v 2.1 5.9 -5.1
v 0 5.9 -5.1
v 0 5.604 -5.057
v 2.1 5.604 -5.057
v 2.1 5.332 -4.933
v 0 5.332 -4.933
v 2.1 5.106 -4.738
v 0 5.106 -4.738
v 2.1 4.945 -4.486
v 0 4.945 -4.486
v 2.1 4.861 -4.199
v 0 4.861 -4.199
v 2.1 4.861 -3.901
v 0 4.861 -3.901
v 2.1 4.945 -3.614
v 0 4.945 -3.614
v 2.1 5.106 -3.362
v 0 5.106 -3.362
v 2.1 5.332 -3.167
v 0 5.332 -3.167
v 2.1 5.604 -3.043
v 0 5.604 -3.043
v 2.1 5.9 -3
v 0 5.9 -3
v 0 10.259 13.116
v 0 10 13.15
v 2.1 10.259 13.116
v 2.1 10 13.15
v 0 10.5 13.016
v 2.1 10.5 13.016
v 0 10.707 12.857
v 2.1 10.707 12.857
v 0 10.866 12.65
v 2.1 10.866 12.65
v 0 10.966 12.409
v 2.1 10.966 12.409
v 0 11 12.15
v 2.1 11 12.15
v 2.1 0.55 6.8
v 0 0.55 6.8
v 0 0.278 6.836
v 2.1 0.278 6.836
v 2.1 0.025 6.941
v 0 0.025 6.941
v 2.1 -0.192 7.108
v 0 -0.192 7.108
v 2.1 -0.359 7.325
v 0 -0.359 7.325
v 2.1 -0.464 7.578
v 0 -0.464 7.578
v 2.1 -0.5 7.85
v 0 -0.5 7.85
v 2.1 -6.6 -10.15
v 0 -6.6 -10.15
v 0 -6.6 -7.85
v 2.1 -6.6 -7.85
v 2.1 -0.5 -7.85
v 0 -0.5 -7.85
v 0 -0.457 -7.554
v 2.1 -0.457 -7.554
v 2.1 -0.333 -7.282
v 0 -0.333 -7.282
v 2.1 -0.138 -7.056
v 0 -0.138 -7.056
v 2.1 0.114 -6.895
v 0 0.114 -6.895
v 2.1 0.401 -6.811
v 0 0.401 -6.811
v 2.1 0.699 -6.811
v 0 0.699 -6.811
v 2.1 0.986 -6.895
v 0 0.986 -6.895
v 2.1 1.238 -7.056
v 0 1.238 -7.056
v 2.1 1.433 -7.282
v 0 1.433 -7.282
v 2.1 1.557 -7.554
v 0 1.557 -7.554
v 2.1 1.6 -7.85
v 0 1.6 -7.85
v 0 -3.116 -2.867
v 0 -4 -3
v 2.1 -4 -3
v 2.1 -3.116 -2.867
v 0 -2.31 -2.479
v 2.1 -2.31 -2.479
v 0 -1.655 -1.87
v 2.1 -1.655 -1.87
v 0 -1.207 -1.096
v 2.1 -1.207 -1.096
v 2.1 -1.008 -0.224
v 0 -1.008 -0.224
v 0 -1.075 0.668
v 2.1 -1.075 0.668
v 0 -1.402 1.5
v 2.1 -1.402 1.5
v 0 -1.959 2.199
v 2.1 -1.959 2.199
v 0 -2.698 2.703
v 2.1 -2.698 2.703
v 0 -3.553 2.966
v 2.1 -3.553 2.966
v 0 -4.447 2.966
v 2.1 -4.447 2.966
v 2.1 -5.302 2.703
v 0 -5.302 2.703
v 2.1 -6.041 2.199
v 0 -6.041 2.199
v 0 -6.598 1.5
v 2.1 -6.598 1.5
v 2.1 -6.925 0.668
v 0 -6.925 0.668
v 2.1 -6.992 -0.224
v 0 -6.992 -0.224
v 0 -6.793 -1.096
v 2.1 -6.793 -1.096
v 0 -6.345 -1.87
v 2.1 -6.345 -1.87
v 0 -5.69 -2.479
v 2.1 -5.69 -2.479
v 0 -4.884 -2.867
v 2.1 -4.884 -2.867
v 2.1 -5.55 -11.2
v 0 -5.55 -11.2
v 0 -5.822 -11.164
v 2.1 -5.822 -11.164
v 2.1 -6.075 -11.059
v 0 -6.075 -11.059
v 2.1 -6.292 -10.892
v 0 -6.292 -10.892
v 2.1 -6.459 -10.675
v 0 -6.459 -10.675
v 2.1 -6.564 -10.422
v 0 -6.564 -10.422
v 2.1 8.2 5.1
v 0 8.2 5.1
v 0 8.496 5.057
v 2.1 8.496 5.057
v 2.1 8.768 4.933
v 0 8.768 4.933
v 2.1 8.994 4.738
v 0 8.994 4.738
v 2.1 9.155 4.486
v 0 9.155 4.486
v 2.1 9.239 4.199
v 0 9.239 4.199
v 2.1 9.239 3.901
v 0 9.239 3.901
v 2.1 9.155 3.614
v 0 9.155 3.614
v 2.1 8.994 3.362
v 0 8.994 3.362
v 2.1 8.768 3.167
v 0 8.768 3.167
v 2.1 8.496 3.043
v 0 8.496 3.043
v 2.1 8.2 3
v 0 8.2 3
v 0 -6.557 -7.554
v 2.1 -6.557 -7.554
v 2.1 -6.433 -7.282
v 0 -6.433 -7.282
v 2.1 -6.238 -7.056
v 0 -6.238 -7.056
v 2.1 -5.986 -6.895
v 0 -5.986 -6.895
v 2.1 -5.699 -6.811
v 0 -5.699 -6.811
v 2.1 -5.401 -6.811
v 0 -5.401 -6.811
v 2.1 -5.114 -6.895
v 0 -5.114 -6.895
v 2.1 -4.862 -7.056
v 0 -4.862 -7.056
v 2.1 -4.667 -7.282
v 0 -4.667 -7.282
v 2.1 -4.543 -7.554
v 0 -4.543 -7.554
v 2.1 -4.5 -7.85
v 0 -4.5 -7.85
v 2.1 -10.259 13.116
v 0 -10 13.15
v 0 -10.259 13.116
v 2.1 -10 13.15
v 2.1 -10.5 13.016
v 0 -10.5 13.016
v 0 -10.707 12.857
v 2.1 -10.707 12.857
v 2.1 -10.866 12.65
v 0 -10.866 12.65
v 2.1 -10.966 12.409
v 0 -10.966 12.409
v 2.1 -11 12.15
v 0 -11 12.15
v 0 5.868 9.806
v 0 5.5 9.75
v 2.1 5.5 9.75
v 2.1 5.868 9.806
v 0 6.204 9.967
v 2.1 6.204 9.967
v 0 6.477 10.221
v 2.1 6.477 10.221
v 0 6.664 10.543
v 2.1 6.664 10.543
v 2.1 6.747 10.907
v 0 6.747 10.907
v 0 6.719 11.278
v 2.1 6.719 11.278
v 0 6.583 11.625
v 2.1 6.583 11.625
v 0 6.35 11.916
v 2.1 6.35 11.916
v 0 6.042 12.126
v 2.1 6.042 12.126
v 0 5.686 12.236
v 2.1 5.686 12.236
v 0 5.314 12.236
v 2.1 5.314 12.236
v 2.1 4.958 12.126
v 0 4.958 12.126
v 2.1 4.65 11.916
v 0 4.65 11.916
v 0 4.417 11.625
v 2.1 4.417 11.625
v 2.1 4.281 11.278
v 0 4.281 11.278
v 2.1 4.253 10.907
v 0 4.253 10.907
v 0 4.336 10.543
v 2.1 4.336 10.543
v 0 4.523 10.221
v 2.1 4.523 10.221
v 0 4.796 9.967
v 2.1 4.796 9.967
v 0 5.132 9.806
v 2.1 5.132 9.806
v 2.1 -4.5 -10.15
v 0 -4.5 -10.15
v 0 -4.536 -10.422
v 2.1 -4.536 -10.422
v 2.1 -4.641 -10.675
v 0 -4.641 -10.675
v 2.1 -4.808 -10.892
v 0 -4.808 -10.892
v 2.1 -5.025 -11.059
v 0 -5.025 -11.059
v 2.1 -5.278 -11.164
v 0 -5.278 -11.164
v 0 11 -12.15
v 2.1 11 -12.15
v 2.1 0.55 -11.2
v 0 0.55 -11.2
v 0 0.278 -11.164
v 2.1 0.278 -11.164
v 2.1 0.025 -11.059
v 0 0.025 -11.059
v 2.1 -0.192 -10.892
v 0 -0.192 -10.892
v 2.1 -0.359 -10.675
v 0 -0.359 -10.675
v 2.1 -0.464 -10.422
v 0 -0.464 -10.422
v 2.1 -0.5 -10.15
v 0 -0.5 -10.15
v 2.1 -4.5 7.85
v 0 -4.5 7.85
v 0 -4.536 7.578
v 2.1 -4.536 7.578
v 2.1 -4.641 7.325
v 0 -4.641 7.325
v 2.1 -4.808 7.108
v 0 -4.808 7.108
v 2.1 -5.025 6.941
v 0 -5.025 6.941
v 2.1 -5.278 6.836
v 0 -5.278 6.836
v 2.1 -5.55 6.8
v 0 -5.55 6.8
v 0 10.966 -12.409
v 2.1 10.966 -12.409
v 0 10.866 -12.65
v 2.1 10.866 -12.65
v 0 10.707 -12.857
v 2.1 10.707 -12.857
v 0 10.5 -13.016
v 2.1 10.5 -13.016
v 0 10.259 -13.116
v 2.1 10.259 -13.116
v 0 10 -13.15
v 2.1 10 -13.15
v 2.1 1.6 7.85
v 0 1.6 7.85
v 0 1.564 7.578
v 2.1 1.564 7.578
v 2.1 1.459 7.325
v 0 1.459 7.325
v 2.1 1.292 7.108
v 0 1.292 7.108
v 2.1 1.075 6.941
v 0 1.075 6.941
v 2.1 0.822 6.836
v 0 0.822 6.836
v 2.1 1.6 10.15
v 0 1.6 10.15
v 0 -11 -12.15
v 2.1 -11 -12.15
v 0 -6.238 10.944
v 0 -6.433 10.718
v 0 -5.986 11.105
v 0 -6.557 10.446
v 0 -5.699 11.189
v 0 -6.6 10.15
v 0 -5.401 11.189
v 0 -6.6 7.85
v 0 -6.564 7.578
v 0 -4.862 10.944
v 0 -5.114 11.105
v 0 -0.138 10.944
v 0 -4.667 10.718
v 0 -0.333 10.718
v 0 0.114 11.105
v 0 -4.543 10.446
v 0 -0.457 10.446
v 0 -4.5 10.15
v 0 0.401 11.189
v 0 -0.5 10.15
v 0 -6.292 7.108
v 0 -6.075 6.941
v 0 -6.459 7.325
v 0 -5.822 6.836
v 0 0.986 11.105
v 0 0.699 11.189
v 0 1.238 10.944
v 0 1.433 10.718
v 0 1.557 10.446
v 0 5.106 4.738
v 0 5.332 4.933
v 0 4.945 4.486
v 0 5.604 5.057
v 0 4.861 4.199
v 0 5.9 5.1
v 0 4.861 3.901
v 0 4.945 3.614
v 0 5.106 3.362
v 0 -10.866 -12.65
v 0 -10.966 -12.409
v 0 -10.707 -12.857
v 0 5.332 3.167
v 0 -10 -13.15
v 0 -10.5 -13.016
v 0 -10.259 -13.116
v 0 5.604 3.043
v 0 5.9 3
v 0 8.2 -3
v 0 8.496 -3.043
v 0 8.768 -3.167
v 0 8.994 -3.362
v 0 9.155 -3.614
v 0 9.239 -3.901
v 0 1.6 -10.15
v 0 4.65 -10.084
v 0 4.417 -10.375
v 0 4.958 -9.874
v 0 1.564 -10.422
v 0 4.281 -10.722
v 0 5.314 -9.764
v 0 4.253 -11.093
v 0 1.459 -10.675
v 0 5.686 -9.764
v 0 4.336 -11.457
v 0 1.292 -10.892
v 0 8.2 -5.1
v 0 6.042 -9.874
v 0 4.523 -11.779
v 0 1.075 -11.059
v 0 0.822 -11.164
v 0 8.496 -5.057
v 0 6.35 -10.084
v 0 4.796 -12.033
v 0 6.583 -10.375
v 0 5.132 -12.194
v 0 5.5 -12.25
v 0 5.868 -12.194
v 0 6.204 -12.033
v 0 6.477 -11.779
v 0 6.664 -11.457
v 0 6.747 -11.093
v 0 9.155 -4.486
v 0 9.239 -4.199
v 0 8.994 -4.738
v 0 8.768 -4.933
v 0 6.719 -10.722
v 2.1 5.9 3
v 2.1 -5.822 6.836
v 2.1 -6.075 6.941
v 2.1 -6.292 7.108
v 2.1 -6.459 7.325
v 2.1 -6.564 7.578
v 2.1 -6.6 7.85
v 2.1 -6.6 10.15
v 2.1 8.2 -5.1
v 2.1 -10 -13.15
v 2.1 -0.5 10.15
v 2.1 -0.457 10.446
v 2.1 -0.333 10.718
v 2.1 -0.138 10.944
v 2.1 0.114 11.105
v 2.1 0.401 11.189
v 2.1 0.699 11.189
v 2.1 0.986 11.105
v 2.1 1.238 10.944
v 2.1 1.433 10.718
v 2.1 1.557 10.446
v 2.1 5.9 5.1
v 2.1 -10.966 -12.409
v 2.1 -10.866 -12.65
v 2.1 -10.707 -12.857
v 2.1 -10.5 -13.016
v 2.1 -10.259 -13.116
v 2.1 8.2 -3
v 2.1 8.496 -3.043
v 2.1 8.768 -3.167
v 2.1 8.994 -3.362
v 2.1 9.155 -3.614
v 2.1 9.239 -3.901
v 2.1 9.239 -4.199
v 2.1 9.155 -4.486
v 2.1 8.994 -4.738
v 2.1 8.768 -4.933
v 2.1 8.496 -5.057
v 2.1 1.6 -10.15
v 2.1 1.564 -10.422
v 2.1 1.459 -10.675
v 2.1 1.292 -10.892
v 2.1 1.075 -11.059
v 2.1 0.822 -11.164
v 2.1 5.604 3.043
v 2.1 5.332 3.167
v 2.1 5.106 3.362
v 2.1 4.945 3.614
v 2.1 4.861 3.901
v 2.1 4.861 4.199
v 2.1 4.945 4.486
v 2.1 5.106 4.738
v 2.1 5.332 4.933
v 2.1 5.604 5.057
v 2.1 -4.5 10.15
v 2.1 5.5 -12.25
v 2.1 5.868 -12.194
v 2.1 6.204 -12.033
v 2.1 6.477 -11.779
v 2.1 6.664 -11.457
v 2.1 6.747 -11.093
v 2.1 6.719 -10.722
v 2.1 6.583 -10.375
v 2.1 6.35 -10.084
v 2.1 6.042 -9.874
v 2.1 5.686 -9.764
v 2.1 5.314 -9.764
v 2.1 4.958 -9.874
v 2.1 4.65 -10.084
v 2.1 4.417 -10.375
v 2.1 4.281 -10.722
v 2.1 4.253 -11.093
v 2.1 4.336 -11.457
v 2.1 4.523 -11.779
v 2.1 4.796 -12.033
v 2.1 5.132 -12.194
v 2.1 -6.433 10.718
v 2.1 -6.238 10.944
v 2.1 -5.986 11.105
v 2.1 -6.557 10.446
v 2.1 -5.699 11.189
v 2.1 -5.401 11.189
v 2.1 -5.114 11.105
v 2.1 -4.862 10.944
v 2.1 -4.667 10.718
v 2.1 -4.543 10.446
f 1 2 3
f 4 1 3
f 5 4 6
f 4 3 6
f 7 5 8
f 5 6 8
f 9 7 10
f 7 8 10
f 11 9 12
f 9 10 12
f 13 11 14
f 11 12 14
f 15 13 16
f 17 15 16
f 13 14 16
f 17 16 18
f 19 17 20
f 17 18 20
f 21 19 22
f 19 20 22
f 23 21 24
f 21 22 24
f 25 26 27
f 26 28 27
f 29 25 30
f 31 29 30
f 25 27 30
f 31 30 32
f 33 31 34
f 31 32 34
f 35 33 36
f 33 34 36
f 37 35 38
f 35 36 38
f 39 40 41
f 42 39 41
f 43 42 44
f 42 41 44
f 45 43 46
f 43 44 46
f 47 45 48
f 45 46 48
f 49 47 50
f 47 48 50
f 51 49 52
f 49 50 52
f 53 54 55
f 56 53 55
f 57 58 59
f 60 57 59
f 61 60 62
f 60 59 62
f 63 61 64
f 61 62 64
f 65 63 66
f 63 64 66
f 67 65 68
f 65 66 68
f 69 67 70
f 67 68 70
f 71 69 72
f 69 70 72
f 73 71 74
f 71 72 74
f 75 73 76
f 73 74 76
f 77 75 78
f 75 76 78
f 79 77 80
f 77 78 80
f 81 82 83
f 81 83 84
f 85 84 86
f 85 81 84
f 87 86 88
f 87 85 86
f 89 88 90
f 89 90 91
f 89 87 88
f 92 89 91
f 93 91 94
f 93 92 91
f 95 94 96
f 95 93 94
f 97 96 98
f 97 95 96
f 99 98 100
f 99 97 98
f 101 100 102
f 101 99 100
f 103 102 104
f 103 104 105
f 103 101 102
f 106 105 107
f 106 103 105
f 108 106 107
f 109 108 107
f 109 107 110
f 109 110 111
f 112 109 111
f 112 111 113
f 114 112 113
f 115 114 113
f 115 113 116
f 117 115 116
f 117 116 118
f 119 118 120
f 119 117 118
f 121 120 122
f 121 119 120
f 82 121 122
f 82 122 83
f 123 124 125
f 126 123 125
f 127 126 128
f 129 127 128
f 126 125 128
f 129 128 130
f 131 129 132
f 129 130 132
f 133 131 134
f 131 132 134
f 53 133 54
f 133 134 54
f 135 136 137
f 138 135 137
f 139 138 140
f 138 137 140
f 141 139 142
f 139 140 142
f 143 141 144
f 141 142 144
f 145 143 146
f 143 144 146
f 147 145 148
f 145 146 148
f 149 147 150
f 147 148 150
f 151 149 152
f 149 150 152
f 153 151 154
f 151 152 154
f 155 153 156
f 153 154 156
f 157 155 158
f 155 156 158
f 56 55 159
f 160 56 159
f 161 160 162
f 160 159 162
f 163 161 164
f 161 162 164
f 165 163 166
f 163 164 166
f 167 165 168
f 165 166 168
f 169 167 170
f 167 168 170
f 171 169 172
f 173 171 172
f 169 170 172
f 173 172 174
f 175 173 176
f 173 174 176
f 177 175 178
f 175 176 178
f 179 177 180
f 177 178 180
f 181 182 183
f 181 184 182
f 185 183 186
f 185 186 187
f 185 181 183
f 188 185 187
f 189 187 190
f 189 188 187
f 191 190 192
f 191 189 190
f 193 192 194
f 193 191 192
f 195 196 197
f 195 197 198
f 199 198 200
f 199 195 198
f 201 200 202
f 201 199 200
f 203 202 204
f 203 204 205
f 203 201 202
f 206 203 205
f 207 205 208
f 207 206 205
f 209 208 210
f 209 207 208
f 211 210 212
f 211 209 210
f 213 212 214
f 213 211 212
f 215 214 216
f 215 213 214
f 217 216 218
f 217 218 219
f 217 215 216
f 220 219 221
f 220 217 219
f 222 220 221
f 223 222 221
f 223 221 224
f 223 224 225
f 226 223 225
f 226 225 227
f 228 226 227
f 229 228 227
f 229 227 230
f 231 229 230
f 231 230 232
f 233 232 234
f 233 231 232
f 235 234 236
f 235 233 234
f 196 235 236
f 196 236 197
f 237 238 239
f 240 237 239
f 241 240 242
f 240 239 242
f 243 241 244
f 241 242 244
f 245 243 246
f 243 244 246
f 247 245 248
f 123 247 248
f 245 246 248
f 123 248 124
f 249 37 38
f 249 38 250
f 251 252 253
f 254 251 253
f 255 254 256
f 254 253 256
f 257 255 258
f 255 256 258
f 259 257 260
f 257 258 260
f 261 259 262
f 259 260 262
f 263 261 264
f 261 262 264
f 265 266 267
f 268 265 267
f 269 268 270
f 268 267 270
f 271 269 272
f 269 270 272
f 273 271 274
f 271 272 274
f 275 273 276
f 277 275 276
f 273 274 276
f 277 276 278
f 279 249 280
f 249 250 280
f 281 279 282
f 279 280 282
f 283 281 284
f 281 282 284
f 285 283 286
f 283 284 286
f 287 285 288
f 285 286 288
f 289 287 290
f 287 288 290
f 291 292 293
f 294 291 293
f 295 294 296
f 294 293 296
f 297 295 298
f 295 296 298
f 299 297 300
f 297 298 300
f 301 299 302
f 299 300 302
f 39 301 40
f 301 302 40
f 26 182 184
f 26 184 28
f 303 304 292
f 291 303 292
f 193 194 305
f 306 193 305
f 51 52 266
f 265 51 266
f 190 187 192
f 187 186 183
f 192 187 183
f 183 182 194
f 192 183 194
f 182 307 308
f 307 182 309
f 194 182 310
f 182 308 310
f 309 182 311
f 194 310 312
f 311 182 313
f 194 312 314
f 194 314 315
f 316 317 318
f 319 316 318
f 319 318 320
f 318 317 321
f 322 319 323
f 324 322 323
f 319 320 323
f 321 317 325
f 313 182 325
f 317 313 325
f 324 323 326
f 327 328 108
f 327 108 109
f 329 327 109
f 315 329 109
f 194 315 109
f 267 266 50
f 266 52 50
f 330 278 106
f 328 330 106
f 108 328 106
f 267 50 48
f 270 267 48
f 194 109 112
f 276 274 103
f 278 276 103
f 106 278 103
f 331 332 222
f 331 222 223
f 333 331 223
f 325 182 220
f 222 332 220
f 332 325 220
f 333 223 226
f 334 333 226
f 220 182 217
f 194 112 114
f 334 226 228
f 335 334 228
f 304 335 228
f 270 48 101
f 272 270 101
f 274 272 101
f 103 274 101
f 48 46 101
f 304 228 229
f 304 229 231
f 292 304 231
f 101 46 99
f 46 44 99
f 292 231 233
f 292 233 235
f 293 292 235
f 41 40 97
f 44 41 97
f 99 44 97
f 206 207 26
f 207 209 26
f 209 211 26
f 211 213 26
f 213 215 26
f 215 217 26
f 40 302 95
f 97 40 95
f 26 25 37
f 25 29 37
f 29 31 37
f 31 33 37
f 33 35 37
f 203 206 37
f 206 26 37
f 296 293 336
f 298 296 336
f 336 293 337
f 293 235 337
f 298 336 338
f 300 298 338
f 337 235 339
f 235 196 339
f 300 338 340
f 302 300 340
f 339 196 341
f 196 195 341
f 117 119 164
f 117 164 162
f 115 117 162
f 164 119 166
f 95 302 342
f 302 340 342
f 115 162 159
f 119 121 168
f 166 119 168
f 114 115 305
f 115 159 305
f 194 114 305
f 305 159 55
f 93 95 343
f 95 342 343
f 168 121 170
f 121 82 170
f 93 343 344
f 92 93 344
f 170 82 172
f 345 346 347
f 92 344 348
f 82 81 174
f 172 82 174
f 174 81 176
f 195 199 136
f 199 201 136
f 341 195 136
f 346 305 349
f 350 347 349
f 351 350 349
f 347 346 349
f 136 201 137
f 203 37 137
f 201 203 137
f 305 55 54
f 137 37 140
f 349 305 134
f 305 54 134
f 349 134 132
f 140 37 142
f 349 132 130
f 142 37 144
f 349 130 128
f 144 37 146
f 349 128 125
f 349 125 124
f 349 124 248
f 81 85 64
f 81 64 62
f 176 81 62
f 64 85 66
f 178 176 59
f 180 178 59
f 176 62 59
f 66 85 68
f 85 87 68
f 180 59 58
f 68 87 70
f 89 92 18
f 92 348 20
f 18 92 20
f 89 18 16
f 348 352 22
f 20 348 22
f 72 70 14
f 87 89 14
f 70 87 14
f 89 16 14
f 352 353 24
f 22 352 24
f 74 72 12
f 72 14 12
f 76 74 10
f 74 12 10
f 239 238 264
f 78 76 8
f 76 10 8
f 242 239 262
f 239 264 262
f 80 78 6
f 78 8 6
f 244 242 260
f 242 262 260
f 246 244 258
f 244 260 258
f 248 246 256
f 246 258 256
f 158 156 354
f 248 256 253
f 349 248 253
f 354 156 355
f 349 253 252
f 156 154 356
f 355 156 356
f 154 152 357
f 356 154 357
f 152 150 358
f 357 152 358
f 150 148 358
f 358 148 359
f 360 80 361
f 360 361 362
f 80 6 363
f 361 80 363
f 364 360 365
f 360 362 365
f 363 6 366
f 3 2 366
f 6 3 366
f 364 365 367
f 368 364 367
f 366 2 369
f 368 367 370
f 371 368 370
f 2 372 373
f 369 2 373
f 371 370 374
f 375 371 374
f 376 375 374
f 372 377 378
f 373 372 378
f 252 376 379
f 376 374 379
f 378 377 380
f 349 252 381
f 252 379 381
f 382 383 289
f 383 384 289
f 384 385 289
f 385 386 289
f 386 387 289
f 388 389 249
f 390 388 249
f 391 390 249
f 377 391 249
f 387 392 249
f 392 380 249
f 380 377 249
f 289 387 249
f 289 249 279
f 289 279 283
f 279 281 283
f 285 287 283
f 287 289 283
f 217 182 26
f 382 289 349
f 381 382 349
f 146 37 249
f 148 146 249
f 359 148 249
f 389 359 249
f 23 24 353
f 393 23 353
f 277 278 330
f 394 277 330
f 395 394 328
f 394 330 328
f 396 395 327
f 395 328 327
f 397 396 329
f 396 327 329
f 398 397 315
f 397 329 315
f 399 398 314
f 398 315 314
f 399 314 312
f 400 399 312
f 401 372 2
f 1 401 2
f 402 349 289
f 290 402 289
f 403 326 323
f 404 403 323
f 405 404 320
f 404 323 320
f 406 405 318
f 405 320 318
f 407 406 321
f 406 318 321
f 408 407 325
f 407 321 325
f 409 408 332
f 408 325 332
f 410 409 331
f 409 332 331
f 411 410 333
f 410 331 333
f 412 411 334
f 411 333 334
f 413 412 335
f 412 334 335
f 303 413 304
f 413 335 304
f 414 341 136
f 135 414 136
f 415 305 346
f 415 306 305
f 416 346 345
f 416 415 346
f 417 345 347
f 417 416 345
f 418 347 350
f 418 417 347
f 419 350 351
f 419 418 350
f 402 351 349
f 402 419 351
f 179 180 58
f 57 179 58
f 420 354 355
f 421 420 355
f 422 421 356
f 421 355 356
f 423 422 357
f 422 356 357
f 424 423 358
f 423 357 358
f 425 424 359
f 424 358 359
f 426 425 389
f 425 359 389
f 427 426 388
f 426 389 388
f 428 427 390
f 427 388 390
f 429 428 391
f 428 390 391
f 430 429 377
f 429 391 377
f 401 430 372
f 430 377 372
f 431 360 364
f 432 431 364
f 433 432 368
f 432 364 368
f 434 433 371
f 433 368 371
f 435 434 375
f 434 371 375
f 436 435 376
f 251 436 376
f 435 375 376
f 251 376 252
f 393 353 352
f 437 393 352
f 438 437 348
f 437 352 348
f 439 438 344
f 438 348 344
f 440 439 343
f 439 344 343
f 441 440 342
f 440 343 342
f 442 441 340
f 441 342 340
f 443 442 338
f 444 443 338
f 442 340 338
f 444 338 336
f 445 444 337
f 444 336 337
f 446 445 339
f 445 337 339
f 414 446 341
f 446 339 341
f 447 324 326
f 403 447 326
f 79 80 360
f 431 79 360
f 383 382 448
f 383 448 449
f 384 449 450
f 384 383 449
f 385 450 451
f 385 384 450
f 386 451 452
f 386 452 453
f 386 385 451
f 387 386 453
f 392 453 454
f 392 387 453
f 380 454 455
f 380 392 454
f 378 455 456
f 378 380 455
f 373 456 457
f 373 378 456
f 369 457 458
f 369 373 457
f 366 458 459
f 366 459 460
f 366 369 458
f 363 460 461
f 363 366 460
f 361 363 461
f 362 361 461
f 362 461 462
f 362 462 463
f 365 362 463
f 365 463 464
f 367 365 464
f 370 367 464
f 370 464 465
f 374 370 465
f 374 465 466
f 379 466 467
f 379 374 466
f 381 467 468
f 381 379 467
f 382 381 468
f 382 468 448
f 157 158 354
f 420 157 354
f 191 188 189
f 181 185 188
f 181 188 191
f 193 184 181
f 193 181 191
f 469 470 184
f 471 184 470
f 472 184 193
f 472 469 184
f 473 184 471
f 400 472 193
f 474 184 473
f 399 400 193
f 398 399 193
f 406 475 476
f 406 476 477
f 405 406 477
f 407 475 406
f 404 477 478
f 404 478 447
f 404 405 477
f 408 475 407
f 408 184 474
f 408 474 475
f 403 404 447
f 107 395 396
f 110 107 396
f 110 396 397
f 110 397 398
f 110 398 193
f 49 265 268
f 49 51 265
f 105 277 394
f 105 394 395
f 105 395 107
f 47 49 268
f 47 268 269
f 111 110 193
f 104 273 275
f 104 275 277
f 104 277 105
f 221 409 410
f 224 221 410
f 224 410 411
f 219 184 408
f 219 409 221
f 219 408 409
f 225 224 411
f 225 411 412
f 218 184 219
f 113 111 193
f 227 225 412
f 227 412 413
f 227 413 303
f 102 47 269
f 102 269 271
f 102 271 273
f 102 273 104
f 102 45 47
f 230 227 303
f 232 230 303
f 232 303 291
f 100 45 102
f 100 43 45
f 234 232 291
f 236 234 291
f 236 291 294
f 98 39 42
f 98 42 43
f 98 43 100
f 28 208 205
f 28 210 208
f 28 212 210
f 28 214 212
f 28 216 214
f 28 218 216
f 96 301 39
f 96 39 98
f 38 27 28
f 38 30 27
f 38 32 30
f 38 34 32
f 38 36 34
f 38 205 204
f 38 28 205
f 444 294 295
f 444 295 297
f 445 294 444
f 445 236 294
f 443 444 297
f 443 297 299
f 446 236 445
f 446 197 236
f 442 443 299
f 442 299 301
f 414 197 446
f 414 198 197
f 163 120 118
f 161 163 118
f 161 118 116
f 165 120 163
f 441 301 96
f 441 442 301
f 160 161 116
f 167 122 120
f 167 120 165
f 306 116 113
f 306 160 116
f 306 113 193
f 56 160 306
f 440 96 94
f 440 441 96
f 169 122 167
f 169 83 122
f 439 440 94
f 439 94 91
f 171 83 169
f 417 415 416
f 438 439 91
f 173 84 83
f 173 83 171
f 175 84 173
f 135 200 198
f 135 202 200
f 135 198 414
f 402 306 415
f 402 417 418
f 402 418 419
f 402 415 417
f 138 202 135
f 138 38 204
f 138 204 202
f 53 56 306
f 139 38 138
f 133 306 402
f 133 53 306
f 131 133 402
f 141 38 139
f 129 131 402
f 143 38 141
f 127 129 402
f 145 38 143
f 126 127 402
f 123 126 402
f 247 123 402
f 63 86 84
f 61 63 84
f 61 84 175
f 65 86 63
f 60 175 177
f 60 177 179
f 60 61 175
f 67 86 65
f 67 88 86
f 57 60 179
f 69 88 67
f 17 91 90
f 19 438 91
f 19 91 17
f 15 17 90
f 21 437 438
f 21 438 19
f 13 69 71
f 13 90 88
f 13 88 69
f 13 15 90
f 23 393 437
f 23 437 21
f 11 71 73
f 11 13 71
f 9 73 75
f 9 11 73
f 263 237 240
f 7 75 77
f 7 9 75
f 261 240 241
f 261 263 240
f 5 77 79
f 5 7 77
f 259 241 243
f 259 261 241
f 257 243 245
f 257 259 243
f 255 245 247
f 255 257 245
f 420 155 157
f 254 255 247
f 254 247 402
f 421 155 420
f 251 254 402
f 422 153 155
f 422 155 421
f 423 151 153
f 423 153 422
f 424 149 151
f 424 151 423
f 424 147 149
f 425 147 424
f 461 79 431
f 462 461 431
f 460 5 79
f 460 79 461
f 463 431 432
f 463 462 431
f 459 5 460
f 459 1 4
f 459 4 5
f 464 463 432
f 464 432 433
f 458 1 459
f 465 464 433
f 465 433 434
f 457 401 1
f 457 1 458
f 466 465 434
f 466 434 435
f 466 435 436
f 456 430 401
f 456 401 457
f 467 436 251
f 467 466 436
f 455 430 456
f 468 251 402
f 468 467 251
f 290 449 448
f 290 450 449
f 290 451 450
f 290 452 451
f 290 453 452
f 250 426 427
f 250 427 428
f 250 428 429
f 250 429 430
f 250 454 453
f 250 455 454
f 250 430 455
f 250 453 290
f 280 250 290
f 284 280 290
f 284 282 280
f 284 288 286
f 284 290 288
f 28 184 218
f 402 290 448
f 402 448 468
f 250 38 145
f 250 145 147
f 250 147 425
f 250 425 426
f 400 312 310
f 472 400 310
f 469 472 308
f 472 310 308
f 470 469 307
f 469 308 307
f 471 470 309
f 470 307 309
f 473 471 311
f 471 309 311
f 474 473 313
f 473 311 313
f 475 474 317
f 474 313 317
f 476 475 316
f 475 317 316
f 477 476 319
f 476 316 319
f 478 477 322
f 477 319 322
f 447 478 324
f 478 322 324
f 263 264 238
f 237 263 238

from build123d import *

# Parameters (mm, degrees)
SKETCH_1_W      = 26.3
SKETCH_1_H      = 22
SKETCH_1_R      = 3
SKETCH_1_R_2    = 1.25
EXTRUDE_1_DEPTH = 2.1
FILLET_1_R      = 1


with BuildPart() as part:
    # 草图1 → 凸台-拉伸1 (new body)
    with BuildSketch(Plane(origin=(0, 0, 0), x_dir=(0, 0, -1), z_dir=(1, 0, 0))):
        Rectangle(SKETCH_1_W, SKETCH_1_H)
        with BuildLine():
            ThreePointArc((-6.8, -5.55), (-7.10753788, -6.29246212), (-7.85, -6.6))
            Line((-7.85, -6.6), (-10.15, -6.6))
            ThreePointArc((-10.15, -6.6), (-11.2, -5.55), (-10.15, -4.5))
            Line((-10.15, -4.5), (-10.15, -0.5))
            ThreePointArc((-10.15, -0.5), (-11.2, 0.55), (-10.15, 1.6))
            Line((-10.15, 1.6), (-7.85, 1.6))
            ThreePointArc((-7.85, 1.6), (-7.10753788, 1.29246212), (-6.8, 0.55))
            ThreePointArc((-6.8, 0.55), (-7.10753788, -0.19246212), (-7.85, -0.5))
            Line((-7.85, -0.5), (-7.85, -4.5))
            ThreePointArc((-7.85, -4.5), (-7.10753788, -4.80753788), (-6.8, -5.55))
        make_face(mode=Mode.SUBTRACT)
        with Locations((0, -4)):
            Circle(SKETCH_1_R, mode=Mode.SUBTRACT)
        with BuildLine():
            ThreePointArc((11.2, -5.55), (10.89246212, -6.29246212), (10.15, -6.6))
            Line((10.15, -6.6), (7.85, -6.6))
            ThreePointArc((7.85, -6.6), (6.8, -5.55), (7.85, -4.5))
            Line((7.85, -4.5), (7.85, -0.5))
            ThreePointArc((7.85, -0.5), (6.8, 0.55), (7.85, 1.6))
            Line((7.85, 1.6), (10.15, 1.6))
            ThreePointArc((10.15, 1.6), (10.89246212, 1.29246212), (11.2, 0.55))
            ThreePointArc((11.2, 0.55), (10.89246212, -0.19246212), (10.15, -0.5))
            Line((10.15, -0.5), (10.15, -4.5))
            ThreePointArc((10.15, -4.5), (10.89246212, -4.80753788), (11.2, -5.55))
        make_face(mode=Mode.SUBTRACT)
        with Locations((-11, 5.5)):
            Circle(SKETCH_1_R_2, mode=Mode.SUBTRACT)
        with BuildLine():
            Line((3, 5.9), (-3, 5.9))
            ThreePointArc((-3, 5.9), (-4.05, 4.85), (-5.1, 5.9))
            Line((-5.1, 5.9), (-5.1, 8.2))
            ThreePointArc((-5.1, 8.2), (-4.05, 9.25), (-3, 8.2))
            Line((-3, 8.2), (3, 8.2))
            ThreePointArc((3, 8.2), (4.05, 9.25), (5.1, 8.2))
            Line((5.1, 8.2), (5.1, 5.9))
            ThreePointArc((5.1, 5.9), (4.05, 4.85), (3, 5.9))
        make_face(mode=Mode.SUBTRACT)
        with Locations((11, 5.5)):
            Circle(SKETCH_1_R_2, mode=Mode.SUBTRACT)
    extrude(amount=EXTRUDE_1_DEPTH)

    # 圆角1
    fillet_1_edges = [part.edges().sort_by_distance(p)[0] for p in [
        (1.05, 11, 13.15),
        (1.05, 11, -13.15),
        (1.05, -11, -13.15),
        (1.05, -11, 13.15),
    ]]
    fillet(fillet_1_edges, radius=FILLET_1_R)


solid = part.part
